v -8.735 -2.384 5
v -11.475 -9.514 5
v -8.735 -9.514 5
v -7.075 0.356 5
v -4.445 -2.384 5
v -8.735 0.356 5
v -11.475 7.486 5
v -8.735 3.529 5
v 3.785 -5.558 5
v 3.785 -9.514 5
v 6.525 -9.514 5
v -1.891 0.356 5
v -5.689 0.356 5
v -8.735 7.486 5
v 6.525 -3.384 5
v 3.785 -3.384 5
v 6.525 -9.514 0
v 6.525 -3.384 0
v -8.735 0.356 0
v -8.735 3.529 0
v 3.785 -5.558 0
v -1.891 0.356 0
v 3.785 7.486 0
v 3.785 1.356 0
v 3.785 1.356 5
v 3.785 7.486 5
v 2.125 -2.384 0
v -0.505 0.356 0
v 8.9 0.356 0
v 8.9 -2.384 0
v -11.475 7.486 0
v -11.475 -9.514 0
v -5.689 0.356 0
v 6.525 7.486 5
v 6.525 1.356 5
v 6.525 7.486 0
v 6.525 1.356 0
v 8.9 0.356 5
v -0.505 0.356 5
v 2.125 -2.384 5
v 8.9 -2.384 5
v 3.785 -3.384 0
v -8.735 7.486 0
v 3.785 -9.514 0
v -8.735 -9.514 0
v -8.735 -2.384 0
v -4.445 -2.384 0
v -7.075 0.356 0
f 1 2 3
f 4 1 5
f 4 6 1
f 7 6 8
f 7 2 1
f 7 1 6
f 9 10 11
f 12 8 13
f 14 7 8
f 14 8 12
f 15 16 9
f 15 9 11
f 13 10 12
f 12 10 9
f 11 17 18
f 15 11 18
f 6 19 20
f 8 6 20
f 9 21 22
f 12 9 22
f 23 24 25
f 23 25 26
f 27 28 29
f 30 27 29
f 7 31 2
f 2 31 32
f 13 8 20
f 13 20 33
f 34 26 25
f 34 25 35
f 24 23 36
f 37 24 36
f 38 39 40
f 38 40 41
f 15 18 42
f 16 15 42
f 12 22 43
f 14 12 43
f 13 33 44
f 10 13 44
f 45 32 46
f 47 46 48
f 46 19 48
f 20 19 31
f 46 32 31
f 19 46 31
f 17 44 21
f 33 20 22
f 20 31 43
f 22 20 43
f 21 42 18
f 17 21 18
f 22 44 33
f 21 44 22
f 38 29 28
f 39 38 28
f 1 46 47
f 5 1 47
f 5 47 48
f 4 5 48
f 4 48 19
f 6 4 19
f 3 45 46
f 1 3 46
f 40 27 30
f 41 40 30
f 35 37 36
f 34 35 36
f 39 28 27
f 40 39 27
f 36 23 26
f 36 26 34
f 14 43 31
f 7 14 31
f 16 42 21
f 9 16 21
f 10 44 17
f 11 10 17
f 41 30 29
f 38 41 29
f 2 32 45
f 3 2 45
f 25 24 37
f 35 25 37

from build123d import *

# Parameters (mm, degrees)
F1_DEPTH = 5
F0_W     = 2.74
F0_H     = 6.13


with BuildPart() as f1:
    # F0 (on Top) → F1 (new body)
    with BuildSketch(Plane.XY):
        Polygon((3.7852868945, -5.5575805881), (-1.8907454386, 0.3556721484), (-5.6887609137, 0.3556721484), (3.7852868945, -9.5143278516), (6.5252868945, -9.5143278516), (6.5252868945, -3.3843278516), (3.7852868945, -3.3843278516), align=None)
        Polygon((-11.4747131055, 7.4856721484), (-11.4747131055, -9.5143278516), (-8.7347131055, -9.5143278516), (-8.7347131055, -2.3843278516), (-4.4448178072, -2.3843278516), (-7.0748979485, 0.3556721484), (-8.7347131055, 0.3556721484), (-8.7347131055, 3.5289248848), (-5.6887609137, 0.3556721484), (-1.8907454386, 0.3556721484), (-8.7347131055, 7.4856721484), align=None)
    extrude(amount=F1_DEPTH)


with BuildPart() as f1b:
    # F0 (on Top) → F1, piece 2 (new body)
    with BuildSketch(Plane.XY):
        with Locations((5.1552868945, 4.4206721484)):
            Rectangle(F0_W, F0_H)
    extrude(amount=F1_DEPTH)


with BuildPart() as f1c:
    # F0 (on Top) → F1, piece 3 (new body)
    with BuildSketch(Plane.XY):
        Polygon((8.8997455651, -2.3843278516), (8.8997455651, 0.3556721484), (-0.5046084038, 0.3556721484), (2.1254717375, -2.3843278516), align=None)
    extrude(amount=F1_DEPTH)


solid = Compound([f1.part, f1b.part, f1c.part])
